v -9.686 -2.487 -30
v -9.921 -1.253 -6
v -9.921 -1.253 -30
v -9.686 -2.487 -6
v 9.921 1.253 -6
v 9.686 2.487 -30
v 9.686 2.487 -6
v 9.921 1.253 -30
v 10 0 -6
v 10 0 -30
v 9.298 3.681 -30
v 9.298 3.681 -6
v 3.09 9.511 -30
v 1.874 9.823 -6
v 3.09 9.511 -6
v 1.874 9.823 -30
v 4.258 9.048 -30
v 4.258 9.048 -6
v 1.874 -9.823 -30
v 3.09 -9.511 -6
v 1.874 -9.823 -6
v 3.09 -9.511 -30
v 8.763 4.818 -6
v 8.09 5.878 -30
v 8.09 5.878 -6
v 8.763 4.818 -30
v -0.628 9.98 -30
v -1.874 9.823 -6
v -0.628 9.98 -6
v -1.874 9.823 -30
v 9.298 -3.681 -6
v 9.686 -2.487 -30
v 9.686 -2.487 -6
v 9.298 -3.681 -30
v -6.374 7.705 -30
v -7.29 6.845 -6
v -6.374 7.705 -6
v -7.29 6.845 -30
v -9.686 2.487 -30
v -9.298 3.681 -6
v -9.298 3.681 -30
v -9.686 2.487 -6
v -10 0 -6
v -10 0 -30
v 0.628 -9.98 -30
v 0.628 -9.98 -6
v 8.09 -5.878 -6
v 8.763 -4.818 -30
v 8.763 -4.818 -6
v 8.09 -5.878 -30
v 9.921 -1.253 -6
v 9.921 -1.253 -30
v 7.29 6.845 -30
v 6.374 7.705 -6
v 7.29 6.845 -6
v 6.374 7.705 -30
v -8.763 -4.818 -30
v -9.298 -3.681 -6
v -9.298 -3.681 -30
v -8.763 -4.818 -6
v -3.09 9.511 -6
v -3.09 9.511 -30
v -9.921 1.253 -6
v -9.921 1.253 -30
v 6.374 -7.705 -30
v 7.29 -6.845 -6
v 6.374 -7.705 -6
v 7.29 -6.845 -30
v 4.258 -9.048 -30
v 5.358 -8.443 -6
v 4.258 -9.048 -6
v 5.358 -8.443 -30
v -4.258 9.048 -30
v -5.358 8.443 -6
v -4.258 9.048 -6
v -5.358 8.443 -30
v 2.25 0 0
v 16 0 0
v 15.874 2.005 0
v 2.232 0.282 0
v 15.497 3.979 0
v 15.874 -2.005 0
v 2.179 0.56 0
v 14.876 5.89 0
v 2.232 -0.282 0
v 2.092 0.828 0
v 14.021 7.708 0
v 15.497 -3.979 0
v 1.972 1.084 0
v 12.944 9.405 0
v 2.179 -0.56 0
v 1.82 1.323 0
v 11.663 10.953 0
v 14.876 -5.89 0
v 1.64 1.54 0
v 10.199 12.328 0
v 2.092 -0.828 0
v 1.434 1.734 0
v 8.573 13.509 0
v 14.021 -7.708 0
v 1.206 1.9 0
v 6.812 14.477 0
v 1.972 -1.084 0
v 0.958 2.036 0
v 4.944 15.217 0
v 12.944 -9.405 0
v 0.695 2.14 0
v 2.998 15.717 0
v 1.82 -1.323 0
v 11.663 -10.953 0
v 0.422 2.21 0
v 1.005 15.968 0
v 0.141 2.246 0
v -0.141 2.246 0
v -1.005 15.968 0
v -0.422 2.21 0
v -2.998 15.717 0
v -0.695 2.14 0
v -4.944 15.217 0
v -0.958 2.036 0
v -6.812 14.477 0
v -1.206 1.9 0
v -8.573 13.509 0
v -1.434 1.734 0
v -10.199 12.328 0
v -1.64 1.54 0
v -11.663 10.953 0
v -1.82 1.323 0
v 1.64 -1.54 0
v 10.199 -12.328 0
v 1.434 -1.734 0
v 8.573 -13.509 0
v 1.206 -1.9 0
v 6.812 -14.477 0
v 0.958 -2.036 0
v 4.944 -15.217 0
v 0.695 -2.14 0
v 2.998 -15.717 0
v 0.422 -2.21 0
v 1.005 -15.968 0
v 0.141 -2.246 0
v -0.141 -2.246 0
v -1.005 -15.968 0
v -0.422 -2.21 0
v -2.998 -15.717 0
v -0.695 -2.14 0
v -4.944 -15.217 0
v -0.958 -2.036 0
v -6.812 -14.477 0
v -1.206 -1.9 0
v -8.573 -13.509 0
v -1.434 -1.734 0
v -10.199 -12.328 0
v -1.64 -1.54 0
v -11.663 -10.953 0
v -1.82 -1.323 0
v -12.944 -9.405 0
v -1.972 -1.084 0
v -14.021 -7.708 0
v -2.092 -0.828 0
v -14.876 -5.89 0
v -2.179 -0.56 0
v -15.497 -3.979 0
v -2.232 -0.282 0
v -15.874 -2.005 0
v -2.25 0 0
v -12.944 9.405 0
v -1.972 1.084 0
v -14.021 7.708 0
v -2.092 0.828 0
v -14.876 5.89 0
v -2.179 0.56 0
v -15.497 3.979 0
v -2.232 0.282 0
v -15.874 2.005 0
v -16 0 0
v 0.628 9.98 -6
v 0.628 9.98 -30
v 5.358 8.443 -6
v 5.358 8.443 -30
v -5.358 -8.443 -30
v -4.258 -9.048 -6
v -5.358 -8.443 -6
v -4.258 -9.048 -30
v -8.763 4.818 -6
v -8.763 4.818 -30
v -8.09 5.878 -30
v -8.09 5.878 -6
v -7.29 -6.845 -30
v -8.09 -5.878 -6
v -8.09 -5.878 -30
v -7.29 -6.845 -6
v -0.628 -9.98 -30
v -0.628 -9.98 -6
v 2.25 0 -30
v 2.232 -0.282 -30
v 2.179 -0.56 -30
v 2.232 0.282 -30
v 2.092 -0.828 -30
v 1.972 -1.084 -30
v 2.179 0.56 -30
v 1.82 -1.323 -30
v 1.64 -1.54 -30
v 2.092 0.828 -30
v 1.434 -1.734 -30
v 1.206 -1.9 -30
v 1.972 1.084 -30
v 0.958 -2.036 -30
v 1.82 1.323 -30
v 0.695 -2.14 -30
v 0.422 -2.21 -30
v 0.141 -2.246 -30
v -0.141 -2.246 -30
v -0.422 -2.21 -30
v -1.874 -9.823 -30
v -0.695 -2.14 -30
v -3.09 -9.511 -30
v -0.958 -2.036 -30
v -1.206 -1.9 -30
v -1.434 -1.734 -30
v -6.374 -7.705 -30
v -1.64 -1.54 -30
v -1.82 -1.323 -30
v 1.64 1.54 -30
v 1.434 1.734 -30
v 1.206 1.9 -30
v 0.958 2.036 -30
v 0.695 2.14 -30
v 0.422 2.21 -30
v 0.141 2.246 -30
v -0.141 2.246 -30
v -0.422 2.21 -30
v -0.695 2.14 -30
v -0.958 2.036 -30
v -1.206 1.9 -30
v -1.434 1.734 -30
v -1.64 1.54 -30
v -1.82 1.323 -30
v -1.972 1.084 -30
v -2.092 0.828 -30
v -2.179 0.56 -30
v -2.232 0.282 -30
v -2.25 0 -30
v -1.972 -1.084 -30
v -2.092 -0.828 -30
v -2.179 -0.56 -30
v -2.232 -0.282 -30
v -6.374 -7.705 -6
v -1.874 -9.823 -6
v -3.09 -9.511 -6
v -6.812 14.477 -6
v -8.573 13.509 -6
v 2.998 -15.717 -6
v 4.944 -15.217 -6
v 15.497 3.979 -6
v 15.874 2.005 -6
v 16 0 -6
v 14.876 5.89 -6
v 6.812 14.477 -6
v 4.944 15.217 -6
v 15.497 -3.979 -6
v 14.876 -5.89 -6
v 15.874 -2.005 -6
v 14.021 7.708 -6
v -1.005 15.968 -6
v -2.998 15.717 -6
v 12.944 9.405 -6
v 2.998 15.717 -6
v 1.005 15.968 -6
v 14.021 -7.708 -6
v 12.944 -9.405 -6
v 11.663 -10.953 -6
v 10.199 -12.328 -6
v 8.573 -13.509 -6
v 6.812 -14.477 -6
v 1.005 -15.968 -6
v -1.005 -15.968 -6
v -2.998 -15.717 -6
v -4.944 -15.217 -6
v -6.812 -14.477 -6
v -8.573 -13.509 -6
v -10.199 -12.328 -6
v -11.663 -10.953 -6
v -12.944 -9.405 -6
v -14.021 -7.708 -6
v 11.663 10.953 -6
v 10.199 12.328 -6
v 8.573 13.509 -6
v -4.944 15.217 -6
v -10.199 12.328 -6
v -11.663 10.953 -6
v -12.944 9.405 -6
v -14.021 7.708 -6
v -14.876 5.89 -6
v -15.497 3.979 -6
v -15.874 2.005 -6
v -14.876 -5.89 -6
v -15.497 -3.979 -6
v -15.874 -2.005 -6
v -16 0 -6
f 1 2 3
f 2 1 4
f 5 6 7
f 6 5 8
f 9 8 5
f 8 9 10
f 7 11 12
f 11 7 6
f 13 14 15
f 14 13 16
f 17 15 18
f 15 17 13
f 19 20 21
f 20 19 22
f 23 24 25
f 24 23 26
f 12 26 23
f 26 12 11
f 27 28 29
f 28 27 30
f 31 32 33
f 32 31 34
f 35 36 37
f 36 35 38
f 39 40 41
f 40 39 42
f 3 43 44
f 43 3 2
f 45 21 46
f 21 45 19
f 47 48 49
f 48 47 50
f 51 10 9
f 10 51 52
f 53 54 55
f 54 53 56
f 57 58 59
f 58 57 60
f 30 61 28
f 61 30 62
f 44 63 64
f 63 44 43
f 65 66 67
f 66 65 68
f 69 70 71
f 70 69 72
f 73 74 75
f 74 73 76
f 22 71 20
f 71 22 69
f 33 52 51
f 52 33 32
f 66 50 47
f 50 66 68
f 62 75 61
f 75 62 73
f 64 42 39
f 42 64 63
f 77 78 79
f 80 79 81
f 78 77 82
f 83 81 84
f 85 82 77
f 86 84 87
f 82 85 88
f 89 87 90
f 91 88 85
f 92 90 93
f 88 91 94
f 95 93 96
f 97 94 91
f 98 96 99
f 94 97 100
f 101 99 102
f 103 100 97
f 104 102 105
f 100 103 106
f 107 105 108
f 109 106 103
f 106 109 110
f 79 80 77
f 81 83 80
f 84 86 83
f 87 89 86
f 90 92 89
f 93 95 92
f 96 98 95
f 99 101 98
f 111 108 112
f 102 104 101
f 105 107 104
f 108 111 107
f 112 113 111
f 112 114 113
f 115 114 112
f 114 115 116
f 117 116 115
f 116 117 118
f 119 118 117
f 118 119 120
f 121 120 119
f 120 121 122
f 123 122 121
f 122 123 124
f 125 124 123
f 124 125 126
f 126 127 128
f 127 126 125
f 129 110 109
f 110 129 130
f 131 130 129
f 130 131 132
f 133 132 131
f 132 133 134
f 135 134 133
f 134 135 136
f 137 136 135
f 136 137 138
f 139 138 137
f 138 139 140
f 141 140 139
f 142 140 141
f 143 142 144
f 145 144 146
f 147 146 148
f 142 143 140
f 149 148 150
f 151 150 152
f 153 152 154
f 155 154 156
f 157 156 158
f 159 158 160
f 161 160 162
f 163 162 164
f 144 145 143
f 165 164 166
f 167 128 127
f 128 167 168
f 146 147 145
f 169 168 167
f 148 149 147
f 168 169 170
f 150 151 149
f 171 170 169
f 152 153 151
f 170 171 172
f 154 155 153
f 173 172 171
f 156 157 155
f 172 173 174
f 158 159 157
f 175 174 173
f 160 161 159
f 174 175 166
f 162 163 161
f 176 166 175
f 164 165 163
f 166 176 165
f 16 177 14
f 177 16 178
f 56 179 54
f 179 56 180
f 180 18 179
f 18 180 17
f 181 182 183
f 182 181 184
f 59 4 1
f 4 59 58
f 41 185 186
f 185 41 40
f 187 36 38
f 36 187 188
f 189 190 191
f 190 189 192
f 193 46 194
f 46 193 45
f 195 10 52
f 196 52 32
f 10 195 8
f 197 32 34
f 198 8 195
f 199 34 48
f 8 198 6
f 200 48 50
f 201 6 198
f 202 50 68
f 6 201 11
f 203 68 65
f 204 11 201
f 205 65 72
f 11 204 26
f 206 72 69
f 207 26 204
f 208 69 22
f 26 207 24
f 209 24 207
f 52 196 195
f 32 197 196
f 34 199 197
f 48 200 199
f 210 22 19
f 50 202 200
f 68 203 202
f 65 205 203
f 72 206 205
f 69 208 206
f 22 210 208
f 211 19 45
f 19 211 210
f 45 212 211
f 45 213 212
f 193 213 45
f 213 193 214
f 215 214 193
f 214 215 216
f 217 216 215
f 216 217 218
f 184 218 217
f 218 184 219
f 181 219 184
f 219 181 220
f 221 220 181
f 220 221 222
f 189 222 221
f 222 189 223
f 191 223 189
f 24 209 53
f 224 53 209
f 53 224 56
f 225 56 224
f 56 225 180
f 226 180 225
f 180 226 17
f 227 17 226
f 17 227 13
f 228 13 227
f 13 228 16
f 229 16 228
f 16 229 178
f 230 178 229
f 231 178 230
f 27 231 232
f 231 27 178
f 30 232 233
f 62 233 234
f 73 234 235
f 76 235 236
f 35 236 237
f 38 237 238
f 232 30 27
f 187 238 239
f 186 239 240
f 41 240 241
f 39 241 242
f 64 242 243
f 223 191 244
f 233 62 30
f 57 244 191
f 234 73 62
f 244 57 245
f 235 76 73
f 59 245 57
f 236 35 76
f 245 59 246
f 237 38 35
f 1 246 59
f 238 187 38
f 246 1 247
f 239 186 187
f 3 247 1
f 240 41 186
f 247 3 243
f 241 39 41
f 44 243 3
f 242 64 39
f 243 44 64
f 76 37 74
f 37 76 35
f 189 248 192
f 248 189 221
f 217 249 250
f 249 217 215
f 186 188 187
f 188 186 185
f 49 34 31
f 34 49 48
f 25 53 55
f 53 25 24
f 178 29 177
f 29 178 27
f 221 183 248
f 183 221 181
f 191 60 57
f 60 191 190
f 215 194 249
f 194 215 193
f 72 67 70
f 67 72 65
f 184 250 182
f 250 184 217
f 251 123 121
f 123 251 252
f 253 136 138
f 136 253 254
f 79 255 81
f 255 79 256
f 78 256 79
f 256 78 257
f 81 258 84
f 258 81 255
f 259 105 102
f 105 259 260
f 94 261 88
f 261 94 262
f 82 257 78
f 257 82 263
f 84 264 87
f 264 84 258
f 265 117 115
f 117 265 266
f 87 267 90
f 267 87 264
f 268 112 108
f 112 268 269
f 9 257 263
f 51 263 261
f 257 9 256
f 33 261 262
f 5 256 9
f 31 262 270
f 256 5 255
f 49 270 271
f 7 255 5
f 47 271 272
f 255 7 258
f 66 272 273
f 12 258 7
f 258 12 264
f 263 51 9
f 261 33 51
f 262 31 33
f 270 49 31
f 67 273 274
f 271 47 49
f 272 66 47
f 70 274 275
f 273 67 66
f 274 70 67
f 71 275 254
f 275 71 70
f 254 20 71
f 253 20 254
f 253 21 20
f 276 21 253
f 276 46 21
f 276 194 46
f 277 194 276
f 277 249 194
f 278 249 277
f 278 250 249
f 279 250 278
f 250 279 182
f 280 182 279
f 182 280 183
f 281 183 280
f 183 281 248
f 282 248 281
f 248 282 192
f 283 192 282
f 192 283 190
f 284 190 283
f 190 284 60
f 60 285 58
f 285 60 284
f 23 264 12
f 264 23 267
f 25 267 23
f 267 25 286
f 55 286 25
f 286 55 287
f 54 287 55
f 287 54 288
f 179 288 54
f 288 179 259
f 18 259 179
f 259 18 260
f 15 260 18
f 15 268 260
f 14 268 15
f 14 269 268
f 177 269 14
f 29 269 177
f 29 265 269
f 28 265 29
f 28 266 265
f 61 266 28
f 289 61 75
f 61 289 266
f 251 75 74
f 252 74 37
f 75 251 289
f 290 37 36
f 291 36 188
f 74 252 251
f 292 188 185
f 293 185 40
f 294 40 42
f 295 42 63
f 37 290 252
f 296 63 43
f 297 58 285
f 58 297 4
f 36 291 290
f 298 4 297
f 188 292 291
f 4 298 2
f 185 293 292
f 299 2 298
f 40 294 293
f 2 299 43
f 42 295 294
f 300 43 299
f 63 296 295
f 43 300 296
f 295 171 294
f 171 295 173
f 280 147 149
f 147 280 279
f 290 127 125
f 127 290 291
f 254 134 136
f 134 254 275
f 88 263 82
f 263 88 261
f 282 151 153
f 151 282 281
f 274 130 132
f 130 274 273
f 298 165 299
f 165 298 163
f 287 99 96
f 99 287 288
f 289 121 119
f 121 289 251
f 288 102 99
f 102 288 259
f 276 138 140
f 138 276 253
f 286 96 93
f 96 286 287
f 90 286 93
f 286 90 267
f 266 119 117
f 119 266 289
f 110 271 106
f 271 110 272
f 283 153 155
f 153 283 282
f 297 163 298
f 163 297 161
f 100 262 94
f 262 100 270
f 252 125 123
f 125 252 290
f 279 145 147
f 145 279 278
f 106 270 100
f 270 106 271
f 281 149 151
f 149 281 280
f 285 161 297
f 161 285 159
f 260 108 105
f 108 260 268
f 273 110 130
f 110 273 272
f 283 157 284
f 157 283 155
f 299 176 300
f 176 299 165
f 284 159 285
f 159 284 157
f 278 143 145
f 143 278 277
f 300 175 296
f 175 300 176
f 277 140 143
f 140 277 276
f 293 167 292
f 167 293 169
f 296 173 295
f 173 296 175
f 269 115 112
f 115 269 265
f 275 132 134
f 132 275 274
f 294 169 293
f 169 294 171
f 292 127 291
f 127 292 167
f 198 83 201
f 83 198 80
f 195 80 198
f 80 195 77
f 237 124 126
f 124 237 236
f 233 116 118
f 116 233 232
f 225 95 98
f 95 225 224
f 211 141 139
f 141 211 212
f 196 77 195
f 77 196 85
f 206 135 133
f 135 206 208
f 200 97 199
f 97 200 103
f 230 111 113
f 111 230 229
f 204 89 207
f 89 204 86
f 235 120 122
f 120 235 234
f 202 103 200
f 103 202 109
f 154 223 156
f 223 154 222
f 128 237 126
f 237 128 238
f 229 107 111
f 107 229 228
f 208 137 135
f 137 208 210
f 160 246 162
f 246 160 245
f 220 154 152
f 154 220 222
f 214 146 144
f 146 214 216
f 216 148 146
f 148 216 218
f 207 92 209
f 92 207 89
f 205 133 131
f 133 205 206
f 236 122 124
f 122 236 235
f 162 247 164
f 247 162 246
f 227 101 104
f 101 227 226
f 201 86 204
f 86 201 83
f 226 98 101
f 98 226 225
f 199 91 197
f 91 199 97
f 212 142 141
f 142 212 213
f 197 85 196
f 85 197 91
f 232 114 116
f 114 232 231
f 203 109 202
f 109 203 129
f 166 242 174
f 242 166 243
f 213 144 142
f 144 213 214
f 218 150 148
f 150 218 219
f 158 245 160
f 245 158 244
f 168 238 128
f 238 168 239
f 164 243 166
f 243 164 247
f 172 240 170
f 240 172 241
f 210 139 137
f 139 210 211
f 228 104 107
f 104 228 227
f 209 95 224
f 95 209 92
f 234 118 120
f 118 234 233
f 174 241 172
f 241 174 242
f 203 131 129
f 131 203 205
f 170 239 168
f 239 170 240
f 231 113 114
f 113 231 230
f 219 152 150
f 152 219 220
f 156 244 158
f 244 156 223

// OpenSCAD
$fn = 50;


difference() {
	union() {
		translate(v = [0, 0, -30.0000000000]) {
			cylinder(h = 30, r = 10.0000000000);
		}
		translate(v = [0, 0, -6.0000000000]) {
			cylinder(h = 6, r = 16.0000000000);
		}
	}
	union() {
		#translate(v = [0, 0, -30]) {
			cylinder(h = 30, r = 2.2500000000);
		}
	}
}
